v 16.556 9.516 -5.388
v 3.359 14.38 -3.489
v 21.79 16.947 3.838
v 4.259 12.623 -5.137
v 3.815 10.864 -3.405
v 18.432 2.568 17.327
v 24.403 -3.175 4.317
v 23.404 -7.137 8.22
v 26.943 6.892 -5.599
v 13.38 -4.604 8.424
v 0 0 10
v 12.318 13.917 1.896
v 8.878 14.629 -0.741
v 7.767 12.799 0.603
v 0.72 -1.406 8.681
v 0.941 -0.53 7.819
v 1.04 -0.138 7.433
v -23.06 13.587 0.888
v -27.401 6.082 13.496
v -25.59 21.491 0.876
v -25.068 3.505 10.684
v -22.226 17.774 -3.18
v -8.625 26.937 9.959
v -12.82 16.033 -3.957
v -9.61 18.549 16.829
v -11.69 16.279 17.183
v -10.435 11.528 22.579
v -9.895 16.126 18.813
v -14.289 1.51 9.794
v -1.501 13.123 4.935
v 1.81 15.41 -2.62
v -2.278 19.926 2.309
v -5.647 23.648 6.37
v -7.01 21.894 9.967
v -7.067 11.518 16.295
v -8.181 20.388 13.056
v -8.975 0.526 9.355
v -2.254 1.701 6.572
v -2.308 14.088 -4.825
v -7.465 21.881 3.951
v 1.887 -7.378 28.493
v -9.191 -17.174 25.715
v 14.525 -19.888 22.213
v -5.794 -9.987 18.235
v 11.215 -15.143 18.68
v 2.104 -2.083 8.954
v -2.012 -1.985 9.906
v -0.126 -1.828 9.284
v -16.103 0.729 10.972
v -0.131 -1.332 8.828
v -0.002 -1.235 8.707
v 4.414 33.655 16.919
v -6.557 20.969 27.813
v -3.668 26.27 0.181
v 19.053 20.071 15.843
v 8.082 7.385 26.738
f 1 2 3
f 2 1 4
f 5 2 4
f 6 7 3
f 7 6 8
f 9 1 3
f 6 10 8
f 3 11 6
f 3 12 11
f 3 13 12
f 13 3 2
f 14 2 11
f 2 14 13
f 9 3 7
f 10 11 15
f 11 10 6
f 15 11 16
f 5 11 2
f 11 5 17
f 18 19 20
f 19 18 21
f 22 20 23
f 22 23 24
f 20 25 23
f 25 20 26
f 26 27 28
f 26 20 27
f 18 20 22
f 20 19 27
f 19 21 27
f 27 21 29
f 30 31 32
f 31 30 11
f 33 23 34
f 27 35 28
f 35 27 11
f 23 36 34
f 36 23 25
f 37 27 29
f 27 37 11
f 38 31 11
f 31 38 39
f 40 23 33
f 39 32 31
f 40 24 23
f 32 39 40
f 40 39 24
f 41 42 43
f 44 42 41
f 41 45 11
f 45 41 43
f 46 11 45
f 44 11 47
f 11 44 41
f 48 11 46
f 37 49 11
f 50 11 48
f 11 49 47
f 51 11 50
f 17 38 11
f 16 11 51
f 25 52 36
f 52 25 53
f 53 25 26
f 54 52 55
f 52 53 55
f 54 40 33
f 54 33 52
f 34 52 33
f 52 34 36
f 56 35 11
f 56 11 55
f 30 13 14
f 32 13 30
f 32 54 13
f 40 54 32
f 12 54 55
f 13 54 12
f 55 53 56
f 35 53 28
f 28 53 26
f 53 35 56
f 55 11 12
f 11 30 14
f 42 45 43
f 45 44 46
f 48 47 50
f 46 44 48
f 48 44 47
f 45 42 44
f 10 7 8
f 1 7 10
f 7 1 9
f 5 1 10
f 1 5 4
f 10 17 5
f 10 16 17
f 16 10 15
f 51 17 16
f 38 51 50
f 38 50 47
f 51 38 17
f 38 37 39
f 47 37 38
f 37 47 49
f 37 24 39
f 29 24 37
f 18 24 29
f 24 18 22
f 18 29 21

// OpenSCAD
seed=rands(0,100,100 ) ;
n= rands(-1,1,3,seed[0]);
o=rands(-10,10,3,seed[1]);
echo(n,o);
planeCrop(  60,n,o ) 
translate([0,0,10])union() {
    for (t = [0: 5]) {
        r = rands(0, 360, 3 ,seed[t]);
       c = rands(0, 1, 3,seed[t]);
     color(c)   rotate(r) cube(20);
    }
}


module crop(maxh = 100) {
    intersection() {
        color() {
            children();
        }
        linear_extrude(maxh)
        hull()
        projection() {
            children();
        }
    }
}
 module planeCrop(maxh = 100,normal,origin) {
     if(normal==[0,0,1])
         {mirror([0,0,1]) 
           translate(-origin)
              crop(maxh)    
                 translate(origin)
                    color() {
                      mirror([0,0,1])  children();
                    }
             }
     else {
     
  translate(origin)
     look_at( [0,0,1],[0,0,0],-normal )
         crop(maxh)    
             look_at(-normal)
               translate(-origin)
                    color() {
                        children();
                    }
               }
           }


module look_at(lookpoint,origin=[0,0,0],rotatefrom=[0,0,1]){
rotations=look_at(lookpoint,origin ,rotatefrom);
rotate(rotations[0],rotations[1]) children();
}
function look_at(p,o=[0,0,0],up=[0,0,1])=let(a=up,b=p-o,c=cross(a,b) ,d=angle(a,b))[d,c];

function angle (a,b)=atan2(sqrt((cross(a, b)*cross(a, b))), (a* b));
